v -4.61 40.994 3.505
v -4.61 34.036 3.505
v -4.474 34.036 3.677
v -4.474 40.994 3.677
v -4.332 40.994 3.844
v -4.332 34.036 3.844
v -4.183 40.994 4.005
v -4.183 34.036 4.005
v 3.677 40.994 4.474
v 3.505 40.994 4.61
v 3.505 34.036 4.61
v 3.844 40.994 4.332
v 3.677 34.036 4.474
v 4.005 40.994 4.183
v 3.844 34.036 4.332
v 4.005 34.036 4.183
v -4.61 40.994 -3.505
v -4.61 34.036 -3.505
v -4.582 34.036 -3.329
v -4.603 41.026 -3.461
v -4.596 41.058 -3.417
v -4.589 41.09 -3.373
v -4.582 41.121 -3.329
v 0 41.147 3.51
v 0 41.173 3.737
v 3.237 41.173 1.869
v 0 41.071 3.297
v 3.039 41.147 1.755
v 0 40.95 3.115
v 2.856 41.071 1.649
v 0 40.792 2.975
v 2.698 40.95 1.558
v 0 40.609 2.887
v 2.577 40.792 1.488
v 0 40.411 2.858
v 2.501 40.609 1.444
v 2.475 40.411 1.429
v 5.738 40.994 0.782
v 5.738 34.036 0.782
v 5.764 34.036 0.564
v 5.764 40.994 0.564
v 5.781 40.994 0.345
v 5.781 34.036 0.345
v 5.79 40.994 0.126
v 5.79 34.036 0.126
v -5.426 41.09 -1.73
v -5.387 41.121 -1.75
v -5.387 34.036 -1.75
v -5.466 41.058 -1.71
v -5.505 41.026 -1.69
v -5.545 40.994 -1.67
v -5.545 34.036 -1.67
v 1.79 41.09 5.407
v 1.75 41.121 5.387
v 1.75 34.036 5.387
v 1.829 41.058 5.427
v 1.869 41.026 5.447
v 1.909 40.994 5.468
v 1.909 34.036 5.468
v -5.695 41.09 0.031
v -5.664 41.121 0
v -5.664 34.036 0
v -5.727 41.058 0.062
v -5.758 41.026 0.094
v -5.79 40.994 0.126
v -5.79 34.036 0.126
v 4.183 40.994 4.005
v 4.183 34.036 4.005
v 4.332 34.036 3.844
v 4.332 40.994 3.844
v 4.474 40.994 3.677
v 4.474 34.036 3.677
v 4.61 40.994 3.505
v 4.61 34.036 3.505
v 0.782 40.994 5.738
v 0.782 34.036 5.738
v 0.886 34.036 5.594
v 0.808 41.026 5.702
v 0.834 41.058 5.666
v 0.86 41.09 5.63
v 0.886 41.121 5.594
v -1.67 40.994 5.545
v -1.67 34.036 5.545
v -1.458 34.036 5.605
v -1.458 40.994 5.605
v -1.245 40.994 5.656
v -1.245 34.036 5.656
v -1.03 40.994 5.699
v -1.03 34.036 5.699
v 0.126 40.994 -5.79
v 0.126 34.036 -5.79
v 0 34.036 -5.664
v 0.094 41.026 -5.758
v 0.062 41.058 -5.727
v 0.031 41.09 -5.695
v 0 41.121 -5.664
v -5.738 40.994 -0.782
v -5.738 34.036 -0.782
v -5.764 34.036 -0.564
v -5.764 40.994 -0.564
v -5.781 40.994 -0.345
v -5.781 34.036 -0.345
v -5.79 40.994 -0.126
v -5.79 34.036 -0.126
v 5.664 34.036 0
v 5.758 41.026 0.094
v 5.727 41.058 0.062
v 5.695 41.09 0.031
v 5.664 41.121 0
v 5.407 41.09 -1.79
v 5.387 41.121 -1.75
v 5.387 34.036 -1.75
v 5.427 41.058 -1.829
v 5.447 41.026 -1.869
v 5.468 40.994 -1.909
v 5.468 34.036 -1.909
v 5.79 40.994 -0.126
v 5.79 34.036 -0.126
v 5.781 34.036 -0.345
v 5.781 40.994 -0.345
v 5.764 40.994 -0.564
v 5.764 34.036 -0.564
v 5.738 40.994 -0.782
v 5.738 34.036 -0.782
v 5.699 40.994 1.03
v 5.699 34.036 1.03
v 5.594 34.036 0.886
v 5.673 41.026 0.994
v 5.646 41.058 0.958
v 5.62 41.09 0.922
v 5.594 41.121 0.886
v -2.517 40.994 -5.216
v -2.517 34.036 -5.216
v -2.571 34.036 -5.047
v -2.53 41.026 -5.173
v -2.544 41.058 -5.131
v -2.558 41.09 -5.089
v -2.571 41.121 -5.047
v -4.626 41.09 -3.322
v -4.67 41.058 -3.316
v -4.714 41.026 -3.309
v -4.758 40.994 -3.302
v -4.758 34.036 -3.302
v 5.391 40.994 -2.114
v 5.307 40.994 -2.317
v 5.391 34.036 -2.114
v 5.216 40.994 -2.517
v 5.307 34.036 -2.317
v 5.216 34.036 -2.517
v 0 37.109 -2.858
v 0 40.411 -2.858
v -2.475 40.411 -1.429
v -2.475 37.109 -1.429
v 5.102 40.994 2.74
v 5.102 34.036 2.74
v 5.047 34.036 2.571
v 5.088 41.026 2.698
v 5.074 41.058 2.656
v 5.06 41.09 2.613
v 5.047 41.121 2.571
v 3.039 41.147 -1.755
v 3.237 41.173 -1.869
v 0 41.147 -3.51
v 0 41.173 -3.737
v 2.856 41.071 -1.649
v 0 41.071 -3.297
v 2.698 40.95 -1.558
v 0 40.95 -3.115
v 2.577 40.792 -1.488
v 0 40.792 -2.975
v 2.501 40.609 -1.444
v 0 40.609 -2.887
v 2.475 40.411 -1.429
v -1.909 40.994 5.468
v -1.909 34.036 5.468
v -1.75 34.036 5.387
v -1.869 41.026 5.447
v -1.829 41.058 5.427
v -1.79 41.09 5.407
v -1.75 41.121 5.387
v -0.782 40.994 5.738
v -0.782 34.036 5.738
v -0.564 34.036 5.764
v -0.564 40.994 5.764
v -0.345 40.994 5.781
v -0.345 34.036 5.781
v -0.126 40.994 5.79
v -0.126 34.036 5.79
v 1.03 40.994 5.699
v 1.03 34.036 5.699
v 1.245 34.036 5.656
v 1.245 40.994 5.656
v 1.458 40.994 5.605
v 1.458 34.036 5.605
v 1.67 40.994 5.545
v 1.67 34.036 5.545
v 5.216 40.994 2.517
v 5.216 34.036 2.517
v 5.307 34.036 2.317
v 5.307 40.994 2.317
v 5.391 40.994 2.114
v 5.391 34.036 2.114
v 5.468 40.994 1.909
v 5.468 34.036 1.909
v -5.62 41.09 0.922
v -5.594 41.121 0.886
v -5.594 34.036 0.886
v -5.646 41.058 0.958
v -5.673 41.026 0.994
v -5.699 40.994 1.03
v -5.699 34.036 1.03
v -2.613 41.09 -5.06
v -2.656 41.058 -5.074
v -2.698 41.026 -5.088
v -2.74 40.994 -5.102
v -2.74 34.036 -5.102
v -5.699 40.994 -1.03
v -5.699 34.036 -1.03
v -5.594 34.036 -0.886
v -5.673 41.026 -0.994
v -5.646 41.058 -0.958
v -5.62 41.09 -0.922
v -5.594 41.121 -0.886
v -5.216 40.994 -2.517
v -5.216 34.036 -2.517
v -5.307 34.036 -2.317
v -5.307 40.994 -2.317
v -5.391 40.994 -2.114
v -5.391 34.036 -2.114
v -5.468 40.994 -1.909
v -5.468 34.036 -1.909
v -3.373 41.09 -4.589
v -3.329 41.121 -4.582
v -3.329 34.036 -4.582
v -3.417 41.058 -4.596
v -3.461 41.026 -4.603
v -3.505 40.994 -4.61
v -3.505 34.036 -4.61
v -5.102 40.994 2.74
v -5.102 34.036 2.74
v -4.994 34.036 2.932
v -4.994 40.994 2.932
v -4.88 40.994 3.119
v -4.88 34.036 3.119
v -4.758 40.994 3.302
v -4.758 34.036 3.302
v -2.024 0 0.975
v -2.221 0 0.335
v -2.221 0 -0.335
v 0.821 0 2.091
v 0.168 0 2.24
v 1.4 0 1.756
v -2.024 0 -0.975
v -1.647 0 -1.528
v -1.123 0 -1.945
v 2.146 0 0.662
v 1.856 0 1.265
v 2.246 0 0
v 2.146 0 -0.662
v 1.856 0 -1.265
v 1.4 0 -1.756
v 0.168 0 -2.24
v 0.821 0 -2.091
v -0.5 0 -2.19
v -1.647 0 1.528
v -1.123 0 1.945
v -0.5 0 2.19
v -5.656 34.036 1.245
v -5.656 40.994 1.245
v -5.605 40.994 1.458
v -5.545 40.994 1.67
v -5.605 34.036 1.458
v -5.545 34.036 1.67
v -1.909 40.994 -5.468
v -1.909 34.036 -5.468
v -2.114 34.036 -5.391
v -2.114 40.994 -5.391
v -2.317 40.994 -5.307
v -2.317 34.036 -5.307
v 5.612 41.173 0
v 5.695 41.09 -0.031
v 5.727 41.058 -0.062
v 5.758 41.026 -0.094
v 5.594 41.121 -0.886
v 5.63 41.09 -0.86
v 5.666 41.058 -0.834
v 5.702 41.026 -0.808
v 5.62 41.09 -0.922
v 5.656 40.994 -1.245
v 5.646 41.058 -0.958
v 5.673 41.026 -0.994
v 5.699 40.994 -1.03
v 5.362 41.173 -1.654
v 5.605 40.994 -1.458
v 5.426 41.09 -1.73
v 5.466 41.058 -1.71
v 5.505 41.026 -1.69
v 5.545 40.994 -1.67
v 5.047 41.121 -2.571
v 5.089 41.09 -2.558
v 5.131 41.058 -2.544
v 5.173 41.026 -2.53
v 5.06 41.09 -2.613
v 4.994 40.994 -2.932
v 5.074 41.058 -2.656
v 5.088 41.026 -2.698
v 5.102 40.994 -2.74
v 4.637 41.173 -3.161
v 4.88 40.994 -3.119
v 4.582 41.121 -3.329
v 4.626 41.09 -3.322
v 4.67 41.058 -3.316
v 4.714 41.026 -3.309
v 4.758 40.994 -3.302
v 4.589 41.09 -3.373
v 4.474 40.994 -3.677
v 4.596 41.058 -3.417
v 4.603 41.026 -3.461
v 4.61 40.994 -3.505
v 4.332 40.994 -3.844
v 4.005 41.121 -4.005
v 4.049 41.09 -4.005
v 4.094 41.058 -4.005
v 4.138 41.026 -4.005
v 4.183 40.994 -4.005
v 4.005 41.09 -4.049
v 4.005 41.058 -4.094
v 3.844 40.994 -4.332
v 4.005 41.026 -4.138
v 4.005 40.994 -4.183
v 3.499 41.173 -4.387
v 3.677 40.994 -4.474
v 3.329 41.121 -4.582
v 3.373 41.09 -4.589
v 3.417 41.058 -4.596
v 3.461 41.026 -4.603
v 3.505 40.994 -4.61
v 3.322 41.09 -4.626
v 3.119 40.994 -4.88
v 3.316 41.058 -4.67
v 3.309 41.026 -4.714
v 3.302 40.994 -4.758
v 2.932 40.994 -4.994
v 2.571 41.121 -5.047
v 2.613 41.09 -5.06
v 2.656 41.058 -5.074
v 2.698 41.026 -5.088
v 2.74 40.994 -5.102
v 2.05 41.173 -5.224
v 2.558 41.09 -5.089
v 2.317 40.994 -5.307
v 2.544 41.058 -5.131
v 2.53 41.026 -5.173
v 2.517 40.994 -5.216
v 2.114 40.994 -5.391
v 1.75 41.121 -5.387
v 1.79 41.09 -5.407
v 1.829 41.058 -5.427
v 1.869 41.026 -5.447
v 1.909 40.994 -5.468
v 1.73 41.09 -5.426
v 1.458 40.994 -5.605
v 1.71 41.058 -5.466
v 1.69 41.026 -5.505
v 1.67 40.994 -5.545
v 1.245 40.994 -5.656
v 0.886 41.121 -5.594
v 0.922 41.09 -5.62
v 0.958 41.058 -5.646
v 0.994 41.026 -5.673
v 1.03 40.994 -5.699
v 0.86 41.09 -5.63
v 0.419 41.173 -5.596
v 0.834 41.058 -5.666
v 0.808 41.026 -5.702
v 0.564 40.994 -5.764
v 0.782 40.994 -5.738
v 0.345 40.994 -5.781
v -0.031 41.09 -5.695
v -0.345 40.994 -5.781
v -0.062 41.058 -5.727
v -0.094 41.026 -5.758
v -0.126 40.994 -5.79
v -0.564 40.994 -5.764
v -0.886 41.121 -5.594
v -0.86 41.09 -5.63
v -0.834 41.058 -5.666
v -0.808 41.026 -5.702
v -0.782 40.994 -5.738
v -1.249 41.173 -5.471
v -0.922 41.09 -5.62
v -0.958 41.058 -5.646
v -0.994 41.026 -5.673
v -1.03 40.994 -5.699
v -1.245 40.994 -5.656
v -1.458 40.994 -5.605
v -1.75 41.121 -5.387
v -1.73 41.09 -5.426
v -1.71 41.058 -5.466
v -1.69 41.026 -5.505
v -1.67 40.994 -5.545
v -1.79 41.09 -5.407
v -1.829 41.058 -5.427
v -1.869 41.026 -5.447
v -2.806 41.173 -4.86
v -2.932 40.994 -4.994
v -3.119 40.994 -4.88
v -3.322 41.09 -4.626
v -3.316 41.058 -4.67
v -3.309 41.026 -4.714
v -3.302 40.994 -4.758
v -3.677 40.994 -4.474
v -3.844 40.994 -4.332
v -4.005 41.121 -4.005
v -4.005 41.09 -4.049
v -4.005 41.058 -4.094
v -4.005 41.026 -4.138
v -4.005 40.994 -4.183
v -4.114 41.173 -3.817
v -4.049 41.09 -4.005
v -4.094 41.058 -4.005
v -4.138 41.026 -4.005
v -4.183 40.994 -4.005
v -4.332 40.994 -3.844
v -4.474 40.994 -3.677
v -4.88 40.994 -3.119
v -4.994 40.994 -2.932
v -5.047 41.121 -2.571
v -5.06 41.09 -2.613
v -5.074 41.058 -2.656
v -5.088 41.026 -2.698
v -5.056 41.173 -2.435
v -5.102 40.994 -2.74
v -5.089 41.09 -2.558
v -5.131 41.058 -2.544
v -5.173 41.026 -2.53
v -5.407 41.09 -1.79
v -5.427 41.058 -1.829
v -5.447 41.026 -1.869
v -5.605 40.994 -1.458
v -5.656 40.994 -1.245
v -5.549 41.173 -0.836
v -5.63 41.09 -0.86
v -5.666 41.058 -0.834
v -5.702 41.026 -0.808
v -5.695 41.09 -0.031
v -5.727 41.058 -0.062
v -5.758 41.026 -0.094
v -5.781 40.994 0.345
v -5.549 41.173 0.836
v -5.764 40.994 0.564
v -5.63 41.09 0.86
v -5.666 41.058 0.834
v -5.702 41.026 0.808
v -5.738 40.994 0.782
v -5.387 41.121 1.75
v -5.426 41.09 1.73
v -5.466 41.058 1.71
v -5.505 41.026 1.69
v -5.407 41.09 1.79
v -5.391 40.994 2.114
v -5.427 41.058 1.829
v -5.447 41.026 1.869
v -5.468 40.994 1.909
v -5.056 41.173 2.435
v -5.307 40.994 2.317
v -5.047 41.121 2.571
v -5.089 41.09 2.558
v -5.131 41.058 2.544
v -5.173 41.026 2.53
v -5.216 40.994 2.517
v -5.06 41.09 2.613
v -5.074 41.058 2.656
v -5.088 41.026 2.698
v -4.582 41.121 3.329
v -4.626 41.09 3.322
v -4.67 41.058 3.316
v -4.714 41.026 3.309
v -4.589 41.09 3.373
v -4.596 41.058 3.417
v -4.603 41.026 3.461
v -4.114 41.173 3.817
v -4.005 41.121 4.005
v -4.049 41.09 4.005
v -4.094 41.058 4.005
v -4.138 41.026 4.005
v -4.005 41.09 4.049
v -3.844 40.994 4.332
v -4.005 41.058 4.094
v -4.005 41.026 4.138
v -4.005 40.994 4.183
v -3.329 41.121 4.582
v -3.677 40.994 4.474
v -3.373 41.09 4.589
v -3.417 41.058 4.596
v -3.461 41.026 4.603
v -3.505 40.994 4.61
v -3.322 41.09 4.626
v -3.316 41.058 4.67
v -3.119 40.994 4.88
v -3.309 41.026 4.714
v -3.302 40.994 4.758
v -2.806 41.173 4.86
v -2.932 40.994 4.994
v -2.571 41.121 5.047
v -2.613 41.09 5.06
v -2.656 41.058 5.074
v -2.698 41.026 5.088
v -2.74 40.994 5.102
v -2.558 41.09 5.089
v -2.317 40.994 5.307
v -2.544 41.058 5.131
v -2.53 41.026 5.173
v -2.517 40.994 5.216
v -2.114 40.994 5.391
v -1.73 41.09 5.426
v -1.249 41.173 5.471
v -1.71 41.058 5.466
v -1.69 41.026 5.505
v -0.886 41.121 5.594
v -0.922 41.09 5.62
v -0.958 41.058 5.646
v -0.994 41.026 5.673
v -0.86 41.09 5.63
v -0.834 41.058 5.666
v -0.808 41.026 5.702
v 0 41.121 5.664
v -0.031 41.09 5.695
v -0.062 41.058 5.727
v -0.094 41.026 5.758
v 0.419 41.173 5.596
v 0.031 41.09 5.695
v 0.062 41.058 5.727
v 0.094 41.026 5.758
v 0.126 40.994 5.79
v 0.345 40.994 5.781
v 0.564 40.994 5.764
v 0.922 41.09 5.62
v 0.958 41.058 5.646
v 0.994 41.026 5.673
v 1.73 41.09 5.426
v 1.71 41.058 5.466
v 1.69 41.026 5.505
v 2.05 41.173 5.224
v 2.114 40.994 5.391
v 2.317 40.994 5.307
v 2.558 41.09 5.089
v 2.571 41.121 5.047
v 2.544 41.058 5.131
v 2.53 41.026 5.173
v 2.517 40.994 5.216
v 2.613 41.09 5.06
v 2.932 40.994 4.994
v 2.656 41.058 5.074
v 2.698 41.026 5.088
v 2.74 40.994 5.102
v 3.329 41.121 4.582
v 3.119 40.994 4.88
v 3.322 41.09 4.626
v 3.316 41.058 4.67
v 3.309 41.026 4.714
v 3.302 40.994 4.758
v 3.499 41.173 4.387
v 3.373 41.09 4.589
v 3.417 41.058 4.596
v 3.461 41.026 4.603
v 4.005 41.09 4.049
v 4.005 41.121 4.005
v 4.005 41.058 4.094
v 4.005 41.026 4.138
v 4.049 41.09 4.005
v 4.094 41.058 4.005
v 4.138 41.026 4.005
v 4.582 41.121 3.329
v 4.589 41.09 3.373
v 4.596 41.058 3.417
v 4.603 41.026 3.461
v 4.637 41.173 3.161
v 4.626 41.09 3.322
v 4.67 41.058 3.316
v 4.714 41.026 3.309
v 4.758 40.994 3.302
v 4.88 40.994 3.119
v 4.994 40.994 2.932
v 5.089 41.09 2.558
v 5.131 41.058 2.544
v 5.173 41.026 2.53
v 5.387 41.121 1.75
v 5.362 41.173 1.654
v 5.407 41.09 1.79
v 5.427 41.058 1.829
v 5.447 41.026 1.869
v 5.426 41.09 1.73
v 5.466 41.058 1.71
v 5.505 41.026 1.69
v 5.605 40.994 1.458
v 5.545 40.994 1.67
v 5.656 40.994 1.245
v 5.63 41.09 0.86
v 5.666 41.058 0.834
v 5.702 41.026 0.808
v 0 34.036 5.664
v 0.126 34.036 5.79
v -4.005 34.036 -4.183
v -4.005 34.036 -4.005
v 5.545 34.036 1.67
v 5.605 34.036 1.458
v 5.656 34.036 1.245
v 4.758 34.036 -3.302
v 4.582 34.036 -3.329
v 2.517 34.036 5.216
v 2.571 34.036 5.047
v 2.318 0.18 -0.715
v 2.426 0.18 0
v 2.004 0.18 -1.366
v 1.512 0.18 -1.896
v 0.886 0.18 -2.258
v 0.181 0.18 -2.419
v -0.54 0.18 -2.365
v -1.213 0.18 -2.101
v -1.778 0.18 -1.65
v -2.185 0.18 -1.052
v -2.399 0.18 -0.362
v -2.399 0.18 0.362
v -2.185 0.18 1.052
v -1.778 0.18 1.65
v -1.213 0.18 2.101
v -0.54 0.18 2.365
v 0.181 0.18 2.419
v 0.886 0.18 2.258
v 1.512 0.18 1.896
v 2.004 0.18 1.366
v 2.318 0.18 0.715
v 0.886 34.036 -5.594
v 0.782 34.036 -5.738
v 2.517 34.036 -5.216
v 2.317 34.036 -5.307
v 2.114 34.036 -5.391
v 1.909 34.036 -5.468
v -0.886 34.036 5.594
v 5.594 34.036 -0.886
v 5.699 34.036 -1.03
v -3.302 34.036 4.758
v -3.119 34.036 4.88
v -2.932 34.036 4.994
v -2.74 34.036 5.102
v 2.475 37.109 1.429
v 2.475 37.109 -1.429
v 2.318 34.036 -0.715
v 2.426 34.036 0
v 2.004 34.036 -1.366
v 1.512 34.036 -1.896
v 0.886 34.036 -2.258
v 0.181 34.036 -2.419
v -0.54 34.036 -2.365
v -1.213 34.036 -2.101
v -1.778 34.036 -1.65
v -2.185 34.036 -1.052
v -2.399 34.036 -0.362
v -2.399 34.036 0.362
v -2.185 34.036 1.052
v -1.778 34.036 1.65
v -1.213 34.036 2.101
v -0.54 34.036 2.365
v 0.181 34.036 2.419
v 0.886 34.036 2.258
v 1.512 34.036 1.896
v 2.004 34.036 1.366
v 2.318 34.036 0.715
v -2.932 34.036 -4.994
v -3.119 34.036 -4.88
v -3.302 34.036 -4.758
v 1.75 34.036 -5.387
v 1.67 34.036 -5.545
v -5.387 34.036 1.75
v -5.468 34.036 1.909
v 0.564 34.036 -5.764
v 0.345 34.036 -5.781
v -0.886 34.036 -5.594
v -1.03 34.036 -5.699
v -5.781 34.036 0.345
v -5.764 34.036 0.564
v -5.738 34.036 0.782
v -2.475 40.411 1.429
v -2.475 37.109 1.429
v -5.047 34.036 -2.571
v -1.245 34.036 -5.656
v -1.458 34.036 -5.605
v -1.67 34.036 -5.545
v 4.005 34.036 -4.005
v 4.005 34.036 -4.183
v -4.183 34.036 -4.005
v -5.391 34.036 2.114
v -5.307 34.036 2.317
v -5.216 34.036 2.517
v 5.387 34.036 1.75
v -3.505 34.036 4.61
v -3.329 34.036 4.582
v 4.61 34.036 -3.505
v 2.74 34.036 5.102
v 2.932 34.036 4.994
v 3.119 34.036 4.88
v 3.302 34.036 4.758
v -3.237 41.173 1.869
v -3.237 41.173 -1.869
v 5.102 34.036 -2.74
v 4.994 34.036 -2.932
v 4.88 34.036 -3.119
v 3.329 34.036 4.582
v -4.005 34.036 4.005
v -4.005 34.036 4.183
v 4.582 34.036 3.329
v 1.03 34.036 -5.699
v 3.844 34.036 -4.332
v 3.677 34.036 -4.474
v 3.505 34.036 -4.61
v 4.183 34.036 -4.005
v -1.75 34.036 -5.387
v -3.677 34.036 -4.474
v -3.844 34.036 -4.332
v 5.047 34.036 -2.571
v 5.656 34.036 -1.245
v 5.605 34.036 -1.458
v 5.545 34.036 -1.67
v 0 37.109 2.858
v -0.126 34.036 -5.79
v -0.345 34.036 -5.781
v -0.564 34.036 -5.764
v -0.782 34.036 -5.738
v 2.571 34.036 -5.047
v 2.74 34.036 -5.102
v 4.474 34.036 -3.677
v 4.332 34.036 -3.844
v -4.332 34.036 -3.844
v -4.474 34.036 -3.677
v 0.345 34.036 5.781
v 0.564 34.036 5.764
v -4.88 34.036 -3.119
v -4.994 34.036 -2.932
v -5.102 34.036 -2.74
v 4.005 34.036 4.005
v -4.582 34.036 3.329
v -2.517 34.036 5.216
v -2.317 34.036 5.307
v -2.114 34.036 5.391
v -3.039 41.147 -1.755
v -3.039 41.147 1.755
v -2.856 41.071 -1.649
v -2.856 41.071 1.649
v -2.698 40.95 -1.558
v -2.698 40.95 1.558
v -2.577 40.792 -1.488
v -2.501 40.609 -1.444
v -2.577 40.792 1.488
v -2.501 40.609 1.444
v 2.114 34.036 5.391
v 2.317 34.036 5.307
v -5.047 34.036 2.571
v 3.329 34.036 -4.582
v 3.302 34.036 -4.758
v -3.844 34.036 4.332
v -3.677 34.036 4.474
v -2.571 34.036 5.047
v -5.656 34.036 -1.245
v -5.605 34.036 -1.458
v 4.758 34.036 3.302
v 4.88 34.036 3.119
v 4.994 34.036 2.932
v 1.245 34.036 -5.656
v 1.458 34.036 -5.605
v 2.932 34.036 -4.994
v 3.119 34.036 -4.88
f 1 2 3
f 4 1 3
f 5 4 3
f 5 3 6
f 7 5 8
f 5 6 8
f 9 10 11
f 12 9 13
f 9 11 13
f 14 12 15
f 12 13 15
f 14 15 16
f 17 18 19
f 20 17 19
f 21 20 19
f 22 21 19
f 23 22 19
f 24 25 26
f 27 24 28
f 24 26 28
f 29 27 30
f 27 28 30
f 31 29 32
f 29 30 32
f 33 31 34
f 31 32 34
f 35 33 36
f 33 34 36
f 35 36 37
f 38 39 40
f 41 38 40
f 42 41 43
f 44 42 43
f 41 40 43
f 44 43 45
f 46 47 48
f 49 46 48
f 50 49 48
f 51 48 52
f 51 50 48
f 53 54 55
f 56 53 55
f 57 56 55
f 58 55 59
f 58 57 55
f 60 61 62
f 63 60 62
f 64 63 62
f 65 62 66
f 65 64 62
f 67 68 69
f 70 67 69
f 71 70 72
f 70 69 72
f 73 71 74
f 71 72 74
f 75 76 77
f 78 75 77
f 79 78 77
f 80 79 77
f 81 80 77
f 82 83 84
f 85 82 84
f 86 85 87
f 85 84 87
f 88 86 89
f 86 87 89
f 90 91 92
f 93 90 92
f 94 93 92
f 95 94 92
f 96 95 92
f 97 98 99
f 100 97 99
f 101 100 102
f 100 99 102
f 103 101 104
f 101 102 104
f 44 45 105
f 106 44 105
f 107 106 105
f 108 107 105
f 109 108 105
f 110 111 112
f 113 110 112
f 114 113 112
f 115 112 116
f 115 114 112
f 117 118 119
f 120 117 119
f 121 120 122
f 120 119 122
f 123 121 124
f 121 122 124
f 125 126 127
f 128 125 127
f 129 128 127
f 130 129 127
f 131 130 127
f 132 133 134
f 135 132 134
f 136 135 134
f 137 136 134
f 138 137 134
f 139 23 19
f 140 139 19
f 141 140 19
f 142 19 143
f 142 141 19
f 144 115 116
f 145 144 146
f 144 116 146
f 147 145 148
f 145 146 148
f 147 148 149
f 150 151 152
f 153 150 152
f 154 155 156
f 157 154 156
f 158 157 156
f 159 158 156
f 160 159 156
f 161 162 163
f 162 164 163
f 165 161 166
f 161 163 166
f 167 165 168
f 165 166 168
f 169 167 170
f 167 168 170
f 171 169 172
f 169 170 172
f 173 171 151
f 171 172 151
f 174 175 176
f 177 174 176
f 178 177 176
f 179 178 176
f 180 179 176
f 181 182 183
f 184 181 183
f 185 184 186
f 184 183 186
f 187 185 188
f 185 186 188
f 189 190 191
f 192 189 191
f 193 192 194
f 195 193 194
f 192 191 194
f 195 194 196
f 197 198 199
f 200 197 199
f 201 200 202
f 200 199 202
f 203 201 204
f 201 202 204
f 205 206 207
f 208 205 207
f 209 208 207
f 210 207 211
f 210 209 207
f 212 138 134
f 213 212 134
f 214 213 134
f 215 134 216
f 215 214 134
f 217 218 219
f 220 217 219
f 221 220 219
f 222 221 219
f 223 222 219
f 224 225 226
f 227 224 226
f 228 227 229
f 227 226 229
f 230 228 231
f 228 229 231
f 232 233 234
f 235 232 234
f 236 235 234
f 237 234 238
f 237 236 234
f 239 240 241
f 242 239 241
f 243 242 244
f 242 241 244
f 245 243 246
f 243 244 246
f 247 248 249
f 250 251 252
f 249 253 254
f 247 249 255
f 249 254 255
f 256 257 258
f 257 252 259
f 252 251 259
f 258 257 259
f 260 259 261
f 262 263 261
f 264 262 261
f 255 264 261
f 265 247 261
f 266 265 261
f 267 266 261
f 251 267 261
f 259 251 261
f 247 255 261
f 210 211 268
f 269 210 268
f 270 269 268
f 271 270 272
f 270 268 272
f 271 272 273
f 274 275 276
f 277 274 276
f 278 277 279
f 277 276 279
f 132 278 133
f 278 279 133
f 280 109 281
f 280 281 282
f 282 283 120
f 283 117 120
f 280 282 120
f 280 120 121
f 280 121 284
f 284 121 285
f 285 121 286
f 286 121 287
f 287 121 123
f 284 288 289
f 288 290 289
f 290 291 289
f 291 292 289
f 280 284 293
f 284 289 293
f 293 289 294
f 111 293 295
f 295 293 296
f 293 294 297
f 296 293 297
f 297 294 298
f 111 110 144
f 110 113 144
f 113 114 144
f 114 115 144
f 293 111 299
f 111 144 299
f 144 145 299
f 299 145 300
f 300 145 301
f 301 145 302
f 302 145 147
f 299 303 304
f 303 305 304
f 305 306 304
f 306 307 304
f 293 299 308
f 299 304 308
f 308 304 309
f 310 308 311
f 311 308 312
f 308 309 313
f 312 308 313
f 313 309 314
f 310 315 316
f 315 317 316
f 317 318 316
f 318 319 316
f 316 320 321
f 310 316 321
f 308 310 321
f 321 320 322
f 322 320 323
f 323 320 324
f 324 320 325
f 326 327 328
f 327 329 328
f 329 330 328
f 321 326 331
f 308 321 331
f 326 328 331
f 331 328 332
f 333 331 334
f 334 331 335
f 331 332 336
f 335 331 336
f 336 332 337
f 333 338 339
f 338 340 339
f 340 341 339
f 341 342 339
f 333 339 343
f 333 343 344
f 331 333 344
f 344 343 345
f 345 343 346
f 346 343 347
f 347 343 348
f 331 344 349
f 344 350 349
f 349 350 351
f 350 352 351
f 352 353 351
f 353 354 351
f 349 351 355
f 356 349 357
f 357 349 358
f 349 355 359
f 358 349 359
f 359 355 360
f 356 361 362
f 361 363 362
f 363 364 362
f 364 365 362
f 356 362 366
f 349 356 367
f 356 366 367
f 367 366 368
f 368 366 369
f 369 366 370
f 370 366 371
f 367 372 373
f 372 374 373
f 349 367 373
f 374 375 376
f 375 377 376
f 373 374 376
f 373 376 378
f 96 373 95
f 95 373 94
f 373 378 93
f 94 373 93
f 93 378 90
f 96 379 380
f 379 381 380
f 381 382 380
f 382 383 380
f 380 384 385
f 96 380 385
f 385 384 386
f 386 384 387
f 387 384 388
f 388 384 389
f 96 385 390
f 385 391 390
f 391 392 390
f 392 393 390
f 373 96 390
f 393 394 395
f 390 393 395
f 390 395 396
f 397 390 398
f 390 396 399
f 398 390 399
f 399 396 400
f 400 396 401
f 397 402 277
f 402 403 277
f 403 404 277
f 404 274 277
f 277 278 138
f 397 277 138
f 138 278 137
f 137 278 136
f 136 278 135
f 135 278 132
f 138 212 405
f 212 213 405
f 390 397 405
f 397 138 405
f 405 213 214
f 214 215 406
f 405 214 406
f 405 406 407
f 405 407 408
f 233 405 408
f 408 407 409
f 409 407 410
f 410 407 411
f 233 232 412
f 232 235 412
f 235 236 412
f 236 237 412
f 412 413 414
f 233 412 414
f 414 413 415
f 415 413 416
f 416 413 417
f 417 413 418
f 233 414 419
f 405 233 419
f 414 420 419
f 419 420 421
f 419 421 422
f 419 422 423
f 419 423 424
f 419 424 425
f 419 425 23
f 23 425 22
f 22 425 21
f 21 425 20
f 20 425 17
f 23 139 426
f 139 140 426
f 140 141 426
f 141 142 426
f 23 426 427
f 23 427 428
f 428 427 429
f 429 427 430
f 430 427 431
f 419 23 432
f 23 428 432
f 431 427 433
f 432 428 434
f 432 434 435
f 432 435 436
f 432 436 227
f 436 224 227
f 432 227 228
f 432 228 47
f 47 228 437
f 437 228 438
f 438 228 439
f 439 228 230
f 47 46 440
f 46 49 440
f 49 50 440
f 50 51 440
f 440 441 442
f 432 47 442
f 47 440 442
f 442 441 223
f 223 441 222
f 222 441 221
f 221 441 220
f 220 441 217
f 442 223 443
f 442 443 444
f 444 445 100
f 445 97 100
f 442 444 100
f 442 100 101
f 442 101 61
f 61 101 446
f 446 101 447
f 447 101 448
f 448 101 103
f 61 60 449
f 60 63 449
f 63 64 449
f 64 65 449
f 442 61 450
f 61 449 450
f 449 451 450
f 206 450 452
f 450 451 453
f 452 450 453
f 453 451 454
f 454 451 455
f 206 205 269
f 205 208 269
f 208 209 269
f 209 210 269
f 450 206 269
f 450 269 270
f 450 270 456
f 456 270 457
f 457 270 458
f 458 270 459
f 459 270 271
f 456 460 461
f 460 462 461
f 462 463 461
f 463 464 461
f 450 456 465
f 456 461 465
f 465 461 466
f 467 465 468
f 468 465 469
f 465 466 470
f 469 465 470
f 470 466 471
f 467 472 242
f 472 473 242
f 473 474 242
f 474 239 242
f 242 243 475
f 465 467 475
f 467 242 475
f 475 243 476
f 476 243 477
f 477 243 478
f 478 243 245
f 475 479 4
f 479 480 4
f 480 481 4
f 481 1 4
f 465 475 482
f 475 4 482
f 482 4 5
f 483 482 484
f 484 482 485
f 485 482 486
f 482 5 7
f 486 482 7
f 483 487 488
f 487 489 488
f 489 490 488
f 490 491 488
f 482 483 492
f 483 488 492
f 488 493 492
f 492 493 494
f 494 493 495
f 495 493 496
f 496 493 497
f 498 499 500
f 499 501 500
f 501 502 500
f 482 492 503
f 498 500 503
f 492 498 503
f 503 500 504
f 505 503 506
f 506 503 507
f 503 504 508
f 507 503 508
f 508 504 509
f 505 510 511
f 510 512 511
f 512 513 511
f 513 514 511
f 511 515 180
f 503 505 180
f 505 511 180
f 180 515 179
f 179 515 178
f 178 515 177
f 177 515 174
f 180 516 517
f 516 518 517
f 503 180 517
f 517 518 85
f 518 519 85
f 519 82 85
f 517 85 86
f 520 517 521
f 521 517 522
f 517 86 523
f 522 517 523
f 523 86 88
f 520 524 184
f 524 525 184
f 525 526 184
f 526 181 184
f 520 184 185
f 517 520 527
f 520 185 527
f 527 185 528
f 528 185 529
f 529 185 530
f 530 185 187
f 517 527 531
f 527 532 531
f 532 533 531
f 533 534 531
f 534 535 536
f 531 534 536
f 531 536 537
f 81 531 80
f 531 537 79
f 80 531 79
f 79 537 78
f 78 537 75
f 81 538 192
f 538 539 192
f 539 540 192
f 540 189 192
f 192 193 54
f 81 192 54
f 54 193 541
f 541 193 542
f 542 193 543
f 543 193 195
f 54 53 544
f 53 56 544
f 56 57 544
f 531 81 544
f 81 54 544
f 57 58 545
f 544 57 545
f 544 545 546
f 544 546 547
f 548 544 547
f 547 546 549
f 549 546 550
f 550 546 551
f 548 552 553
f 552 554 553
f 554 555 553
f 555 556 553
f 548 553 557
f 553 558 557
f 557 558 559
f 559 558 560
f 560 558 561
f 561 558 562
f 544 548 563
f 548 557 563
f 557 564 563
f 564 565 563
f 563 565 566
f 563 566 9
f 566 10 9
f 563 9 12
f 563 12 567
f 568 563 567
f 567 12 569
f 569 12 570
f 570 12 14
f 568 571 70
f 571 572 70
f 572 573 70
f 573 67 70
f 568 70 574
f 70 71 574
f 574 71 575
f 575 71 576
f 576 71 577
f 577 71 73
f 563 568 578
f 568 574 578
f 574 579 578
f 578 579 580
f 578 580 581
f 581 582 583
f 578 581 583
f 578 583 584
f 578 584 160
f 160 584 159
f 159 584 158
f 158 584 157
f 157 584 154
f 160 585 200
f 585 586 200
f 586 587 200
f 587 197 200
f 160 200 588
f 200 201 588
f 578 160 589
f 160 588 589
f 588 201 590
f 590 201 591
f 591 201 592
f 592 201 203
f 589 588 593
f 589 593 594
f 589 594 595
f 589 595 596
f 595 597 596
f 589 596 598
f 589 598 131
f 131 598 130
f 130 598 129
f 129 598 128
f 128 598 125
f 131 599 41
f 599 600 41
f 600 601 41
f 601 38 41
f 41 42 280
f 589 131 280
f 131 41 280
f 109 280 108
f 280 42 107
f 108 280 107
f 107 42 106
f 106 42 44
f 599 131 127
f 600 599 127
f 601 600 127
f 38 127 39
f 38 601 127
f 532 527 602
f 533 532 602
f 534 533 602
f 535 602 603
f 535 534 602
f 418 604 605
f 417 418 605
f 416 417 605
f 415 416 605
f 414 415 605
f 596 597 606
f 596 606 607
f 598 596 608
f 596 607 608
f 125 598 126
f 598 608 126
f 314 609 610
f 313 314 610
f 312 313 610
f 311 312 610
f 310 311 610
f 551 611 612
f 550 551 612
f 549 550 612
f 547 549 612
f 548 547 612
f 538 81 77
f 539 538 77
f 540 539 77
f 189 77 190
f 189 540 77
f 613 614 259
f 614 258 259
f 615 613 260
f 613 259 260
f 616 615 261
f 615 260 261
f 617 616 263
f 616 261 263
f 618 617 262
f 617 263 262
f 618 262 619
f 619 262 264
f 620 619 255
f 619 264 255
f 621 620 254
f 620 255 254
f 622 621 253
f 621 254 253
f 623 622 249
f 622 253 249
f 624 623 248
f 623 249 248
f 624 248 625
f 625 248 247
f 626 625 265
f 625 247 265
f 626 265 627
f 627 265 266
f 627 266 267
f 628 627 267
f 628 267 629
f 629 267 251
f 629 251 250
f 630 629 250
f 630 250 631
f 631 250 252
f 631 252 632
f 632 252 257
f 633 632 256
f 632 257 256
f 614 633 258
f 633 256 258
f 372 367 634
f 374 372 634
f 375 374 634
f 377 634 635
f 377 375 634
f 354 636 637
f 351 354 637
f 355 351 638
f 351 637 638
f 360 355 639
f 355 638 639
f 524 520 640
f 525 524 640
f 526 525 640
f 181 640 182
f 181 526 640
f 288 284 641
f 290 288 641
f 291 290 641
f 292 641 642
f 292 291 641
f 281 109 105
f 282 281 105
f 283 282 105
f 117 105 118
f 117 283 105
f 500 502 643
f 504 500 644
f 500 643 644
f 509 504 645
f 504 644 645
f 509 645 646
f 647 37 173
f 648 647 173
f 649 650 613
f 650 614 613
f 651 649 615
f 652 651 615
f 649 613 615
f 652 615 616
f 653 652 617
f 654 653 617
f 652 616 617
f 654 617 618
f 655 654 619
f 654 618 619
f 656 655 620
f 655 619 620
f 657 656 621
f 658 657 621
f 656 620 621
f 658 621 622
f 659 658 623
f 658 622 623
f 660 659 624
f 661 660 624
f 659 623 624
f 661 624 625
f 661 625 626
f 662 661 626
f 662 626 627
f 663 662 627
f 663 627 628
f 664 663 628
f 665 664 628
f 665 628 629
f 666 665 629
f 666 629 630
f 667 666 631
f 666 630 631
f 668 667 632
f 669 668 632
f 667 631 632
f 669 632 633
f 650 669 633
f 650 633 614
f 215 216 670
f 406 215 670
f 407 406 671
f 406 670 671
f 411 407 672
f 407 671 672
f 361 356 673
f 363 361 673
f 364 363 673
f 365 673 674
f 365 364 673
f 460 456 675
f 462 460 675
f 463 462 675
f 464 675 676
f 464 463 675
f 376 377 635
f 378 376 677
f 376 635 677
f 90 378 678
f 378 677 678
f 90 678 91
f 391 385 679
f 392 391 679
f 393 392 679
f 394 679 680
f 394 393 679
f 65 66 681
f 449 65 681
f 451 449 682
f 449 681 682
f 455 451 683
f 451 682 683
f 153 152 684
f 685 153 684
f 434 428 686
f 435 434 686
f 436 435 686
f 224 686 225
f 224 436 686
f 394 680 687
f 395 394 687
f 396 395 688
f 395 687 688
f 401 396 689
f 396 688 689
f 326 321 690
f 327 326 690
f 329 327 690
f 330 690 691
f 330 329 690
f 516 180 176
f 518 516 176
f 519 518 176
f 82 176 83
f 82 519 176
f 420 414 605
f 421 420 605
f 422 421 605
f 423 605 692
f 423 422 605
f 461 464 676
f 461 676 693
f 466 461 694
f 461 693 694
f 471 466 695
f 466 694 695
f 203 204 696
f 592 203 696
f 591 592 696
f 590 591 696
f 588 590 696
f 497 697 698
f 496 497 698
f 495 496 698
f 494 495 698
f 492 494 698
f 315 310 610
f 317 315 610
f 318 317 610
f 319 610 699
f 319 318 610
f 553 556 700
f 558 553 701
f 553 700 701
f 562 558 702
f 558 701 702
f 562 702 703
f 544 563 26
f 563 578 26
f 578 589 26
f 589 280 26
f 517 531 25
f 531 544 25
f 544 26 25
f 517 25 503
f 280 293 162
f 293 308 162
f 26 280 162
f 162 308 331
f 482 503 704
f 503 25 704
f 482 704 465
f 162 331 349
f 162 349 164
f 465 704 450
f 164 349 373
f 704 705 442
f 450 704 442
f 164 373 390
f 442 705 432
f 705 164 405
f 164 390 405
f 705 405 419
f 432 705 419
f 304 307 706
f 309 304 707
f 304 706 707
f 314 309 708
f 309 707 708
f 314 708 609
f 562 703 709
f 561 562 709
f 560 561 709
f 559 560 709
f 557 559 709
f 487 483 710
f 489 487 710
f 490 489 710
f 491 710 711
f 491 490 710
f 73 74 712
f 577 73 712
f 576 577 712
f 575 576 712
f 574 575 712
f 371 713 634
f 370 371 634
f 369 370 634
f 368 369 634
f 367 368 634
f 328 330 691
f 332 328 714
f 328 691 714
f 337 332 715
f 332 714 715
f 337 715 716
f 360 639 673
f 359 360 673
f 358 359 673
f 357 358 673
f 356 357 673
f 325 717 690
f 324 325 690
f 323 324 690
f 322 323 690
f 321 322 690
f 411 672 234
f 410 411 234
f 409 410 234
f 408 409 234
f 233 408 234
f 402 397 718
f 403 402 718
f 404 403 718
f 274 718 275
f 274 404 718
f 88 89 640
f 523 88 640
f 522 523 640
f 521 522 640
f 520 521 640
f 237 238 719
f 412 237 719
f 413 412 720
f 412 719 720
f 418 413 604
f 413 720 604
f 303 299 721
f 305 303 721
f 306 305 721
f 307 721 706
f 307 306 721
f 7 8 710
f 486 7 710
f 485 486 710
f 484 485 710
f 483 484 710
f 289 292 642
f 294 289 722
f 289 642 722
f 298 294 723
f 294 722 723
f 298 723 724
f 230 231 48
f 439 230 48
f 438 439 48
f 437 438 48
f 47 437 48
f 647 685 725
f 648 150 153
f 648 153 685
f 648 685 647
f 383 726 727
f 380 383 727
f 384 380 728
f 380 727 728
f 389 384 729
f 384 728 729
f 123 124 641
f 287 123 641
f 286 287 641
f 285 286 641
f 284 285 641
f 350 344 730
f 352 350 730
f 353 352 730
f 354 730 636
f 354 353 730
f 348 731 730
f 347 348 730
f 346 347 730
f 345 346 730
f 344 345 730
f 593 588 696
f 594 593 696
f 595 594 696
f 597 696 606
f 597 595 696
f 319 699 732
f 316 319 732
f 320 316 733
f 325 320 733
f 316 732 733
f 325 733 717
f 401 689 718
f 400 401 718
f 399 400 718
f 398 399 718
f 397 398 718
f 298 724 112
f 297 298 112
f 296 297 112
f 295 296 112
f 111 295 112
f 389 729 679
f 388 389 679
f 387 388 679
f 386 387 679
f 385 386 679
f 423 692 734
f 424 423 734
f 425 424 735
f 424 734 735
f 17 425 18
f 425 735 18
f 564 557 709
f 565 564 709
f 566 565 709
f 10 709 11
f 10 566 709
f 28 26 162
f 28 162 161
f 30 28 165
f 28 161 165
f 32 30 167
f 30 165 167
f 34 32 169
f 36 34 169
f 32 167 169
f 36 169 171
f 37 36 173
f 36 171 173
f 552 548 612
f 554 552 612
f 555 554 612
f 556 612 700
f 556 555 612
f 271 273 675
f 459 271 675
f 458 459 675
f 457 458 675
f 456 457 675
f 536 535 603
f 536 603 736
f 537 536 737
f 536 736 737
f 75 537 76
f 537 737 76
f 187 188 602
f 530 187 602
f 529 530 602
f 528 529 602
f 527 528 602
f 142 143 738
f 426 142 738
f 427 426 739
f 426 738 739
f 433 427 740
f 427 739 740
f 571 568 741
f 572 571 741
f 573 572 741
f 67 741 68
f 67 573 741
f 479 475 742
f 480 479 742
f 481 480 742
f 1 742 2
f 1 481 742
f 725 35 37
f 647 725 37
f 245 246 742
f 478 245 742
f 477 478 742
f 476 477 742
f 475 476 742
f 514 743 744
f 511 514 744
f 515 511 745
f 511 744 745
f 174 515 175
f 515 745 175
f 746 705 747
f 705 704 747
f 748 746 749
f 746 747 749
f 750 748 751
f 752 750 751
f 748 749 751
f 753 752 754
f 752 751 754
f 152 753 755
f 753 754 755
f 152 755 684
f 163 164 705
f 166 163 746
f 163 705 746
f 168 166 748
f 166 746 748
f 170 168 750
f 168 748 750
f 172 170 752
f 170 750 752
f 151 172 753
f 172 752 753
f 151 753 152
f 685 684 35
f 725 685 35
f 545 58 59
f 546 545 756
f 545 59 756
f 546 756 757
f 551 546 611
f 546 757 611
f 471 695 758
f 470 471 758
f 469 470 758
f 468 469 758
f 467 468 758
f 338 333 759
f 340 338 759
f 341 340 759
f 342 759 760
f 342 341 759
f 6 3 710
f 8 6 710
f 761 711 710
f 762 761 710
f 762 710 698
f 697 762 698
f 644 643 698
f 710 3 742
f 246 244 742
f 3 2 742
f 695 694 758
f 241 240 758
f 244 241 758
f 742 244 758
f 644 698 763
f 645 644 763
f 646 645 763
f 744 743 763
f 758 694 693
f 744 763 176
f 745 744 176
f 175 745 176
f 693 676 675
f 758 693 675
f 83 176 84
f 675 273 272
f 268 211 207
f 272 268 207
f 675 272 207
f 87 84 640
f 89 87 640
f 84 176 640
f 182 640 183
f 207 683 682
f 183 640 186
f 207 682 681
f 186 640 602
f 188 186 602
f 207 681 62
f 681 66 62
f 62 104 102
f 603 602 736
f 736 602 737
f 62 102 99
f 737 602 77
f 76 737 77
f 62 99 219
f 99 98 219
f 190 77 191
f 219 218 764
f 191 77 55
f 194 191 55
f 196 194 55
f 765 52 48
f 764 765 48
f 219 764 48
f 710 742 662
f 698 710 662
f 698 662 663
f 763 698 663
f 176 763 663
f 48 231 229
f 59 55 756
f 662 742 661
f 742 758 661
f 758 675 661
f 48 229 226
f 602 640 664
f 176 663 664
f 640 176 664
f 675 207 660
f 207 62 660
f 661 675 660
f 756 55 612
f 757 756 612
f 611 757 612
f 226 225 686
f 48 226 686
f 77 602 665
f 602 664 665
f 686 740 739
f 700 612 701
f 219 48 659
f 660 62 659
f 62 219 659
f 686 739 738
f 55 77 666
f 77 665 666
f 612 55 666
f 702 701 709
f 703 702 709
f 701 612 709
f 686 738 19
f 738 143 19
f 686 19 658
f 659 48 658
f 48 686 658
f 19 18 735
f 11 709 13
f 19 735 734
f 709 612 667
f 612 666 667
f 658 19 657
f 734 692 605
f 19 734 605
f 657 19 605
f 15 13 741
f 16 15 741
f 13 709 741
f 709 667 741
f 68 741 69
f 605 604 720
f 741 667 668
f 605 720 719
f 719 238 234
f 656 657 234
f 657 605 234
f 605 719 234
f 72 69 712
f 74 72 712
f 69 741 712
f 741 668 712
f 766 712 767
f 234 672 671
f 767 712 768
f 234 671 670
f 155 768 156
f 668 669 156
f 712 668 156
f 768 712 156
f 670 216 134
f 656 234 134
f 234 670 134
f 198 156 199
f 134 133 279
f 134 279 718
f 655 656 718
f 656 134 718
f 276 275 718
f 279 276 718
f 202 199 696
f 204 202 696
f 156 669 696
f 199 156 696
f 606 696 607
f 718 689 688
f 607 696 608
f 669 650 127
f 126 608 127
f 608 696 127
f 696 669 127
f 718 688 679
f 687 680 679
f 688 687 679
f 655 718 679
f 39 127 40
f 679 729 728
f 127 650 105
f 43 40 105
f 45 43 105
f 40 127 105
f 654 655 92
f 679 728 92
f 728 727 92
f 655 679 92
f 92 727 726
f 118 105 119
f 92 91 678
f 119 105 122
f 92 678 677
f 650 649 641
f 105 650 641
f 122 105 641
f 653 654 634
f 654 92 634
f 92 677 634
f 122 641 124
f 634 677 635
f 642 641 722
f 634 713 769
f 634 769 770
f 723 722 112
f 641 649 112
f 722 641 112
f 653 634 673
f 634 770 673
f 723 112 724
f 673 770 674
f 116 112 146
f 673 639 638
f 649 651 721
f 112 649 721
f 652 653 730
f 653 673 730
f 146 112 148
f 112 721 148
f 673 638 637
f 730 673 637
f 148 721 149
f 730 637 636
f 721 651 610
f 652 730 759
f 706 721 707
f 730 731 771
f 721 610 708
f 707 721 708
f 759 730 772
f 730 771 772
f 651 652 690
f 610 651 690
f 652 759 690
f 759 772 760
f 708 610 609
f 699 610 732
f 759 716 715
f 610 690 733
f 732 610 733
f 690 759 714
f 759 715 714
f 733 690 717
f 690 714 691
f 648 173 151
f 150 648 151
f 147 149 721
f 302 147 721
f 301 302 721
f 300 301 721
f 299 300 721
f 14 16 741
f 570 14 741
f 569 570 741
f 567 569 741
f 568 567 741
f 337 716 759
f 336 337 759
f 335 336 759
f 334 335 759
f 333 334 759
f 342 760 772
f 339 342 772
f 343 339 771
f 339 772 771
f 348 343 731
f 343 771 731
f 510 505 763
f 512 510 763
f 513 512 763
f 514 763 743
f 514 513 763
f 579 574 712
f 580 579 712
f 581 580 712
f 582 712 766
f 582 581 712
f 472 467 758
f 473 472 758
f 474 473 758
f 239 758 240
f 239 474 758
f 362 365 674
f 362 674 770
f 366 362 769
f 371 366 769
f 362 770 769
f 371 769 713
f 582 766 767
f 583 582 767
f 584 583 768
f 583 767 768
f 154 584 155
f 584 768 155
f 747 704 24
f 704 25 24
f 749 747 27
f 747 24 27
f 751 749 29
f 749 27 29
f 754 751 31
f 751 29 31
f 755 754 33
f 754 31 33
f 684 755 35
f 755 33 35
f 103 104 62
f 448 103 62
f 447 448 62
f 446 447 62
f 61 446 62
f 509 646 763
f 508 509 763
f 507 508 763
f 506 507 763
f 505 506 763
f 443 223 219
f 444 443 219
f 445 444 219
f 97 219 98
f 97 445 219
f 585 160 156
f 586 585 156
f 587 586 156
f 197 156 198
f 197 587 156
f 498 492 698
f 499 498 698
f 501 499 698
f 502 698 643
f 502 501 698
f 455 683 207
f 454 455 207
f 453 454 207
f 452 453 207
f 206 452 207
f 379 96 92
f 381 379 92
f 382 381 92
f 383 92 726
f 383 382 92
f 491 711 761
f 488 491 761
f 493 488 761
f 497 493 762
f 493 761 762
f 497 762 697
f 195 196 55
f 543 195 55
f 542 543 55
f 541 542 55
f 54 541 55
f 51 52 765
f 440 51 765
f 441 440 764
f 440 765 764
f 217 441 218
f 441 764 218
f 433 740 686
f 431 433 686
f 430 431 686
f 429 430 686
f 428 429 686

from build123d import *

# Parameters (mm, degrees)
CUT_EXTRUDE1_DEPTH = 4.064
FILLET1_R          = 0.762
CUT_EXTRUDE3_DEPTH = 9.144
CIRPATTERN1_COUNT  = 40


with BuildPart() as part:
    # Sketch1 → Revolve1 (revolve)
    with BuildSketch(Plane.XY):
        Polygon((0, 0), (0, 41.1734), (5.611594878, 41.1734), (5.7912, 40.993794878), (5.7912, 34.036), (2.4257, 34.036), (2.4257, 0.179605122), (2.246094878, 0), align=None)
    revolve(axis=Axis((0, 0, 0), (0, 1, 0)))

    # Sketch2 → Cut-Extrude1 (cut)
    with BuildSketch(Plane(origin=(0, 41.1734, 0), x_dir=(1, 0, 0), z_dir=(0, 1, 0))):
        Polygon((0, -2.8575), (2.474667591, -1.42875), (2.474667591, 1.42875), (0, 2.8575), (-2.474667591, 1.42875), (-2.474667591, -1.42875), align=None)
    extrude(amount=-CUT_EXTRUDE1_DEPTH, mode=Mode.SUBTRACT)

    # Fillet1
    fillet1_edges = [part.edges().sort_by_distance(p)[0] for p in [
        (-1.237333796, 41.1734, 2.143125),
        (1.237333796, 41.1734, 2.143125),
        (2.474667591, 41.1734, 0),
        (1.237333796, 41.1734, -2.143125),
        (-1.237333796, 41.1734, -2.143125),
        (-2.474667591, 41.1734, 0),
    ]]
    fillet(fillet1_edges, radius=FILLET1_R)

    # Sketch3 → Cut-Extrude3 (cut)
    with BuildSketch(Plane(origin=(0, 41.1734, 0), x_dir=(1, 0, 0), z_dir=(0, 1, 0))):
        Polygon((0, 5.6642), (-2.032, 7.6962), (2.032, 7.6962), align=None)
    cut_extrude3 = extrude(amount=-CUT_EXTRUDE3_DEPTH, mode=Mode.SUBTRACT)

    # CirPattern1: Cut-Extrude3 ×40 about axis
    cirpattern1_axis = Axis((0, 0, 0), (0, 1, 0))
    for i in range(1, CIRPATTERN1_COUNT):
        add(cut_extrude3.rotate(cirpattern1_axis, i * 360 / CIRPATTERN1_COUNT), mode=Mode.SUBTRACT)


solid = part.part
